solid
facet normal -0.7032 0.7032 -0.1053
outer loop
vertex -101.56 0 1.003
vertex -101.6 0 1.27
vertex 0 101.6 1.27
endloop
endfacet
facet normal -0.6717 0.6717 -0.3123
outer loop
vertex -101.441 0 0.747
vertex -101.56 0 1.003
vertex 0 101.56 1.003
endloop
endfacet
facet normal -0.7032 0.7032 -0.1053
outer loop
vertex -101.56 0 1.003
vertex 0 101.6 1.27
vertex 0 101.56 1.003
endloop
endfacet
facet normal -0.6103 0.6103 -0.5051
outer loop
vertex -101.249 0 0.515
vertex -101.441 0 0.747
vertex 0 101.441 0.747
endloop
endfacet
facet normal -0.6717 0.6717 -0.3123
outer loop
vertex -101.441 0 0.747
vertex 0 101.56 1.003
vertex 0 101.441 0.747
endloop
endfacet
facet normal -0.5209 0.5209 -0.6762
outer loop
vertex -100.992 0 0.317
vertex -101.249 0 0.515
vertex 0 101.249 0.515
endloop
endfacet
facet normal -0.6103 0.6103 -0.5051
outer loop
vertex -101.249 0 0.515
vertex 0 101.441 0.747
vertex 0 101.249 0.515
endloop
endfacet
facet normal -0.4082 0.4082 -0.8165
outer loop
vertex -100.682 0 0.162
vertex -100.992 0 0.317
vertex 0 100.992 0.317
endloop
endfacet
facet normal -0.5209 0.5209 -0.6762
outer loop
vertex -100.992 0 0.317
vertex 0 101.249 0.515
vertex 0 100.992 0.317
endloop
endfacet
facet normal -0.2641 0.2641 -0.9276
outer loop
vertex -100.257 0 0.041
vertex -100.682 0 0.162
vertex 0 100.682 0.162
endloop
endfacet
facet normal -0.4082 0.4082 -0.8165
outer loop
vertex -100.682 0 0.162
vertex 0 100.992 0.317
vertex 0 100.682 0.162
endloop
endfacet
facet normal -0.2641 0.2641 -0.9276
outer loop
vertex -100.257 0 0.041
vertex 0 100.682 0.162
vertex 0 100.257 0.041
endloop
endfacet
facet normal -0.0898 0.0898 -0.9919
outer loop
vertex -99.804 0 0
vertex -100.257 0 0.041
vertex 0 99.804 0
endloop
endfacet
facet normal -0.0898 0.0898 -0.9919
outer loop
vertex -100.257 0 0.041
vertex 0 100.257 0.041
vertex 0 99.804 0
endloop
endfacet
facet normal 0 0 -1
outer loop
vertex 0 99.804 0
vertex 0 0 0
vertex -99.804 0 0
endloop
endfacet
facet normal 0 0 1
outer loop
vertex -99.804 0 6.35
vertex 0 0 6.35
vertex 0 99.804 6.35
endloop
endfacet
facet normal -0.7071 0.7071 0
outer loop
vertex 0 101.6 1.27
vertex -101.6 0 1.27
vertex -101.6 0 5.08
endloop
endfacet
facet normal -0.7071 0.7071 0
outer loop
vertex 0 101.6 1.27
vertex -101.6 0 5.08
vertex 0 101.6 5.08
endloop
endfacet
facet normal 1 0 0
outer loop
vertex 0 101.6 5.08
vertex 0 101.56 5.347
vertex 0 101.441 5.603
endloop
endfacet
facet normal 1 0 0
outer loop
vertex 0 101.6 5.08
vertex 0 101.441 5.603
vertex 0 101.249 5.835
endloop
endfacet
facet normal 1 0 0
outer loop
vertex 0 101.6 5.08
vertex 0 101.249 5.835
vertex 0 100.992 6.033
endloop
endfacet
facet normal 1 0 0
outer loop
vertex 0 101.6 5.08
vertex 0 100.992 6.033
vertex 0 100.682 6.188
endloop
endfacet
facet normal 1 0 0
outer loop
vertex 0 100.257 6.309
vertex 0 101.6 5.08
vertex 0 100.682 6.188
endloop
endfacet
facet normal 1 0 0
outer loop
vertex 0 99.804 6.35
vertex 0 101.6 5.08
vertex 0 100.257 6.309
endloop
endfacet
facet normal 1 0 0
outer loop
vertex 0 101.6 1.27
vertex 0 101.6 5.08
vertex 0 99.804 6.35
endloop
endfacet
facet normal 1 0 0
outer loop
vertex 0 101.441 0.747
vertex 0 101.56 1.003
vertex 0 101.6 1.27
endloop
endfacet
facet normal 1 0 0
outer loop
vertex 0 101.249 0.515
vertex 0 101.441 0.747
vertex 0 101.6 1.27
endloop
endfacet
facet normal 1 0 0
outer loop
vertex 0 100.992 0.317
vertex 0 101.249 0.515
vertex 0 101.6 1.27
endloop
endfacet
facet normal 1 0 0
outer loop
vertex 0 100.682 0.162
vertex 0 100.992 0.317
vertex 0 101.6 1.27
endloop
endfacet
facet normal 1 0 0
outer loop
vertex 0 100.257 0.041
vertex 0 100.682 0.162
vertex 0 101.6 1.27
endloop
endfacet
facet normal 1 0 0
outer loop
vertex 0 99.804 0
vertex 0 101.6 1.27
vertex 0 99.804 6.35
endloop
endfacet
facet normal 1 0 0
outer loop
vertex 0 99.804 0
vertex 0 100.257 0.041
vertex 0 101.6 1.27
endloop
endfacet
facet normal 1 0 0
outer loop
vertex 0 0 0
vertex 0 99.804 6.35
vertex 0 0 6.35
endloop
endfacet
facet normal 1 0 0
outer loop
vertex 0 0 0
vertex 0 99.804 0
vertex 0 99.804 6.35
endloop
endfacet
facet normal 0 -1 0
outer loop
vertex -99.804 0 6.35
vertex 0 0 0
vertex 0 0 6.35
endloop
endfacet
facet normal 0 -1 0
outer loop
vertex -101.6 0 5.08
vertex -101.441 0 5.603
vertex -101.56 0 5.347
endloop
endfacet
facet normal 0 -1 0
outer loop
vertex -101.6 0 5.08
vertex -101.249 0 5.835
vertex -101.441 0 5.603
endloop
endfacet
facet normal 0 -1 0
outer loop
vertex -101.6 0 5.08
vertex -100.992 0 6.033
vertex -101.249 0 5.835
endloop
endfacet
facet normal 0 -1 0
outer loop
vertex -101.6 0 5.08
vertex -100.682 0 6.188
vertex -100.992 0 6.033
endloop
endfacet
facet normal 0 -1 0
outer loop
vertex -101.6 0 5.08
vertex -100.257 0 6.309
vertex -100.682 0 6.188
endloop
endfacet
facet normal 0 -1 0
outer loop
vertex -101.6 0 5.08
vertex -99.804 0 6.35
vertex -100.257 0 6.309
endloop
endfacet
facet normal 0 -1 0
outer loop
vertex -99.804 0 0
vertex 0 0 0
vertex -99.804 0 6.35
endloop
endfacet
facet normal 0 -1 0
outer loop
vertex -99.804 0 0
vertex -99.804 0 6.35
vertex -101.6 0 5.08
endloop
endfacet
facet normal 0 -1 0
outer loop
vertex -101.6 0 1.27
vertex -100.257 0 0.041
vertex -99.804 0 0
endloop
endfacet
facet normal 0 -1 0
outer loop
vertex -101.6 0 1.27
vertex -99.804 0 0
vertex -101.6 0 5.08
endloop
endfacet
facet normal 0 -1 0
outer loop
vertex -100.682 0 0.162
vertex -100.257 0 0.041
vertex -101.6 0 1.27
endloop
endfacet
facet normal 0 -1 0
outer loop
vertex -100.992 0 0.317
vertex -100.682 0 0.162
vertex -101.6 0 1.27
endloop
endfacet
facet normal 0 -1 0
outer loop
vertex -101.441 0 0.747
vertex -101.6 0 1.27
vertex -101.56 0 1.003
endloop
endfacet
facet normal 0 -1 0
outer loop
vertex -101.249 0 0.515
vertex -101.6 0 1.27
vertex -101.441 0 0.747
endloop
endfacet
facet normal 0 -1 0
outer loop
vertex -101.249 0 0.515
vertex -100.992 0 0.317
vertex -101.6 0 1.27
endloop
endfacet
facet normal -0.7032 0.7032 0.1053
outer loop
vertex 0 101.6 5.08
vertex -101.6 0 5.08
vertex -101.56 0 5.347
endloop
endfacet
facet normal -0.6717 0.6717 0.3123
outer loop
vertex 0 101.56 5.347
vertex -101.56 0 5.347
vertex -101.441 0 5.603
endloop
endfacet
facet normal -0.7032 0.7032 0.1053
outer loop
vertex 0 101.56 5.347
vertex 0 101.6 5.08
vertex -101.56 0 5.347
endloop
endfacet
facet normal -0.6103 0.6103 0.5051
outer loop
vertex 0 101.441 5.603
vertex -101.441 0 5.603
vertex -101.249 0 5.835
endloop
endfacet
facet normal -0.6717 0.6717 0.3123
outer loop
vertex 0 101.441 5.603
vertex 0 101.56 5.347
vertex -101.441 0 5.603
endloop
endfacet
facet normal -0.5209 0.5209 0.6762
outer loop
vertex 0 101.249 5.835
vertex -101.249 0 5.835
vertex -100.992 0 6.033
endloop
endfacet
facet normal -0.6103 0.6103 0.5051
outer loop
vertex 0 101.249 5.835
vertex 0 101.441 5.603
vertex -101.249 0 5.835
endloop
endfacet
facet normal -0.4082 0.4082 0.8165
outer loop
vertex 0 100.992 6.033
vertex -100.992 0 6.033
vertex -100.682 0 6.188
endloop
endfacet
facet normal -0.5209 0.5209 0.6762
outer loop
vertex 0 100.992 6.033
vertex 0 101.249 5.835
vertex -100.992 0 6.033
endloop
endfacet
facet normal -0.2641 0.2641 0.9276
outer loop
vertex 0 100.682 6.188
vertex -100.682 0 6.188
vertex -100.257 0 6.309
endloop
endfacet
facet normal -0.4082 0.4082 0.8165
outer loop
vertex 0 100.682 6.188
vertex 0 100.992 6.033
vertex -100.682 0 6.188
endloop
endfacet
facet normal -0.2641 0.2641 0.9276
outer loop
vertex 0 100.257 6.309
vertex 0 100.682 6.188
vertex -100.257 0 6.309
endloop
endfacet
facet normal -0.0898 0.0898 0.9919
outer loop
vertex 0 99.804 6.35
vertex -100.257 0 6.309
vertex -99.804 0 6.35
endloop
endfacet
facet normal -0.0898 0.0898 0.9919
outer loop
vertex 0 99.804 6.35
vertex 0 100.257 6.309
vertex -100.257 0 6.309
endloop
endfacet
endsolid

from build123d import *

# Parameters (mm, degrees)
BOSS_EXTRUDE1_DEPTH = 6.35
FILLET2_R           = 1.27
FILLET3_R           = 1.27


with BuildPart() as part:
    # Sketch1 → Boss-Extrude1 (new body)
    with BuildSketch(Plane.XY):
        Polygon((0, 0), (-101.6, 0), (0, 101.6), align=None)
    extrude(amount=BOSS_EXTRUDE1_DEPTH)

    # Fillet2
    fillet2_edges = [part.edges().sort_by_distance(p)[0] for p in [
        (-50.8, 50.8, 6.35),
    ]]
    fillet(fillet2_edges, radius=FILLET2_R)

    # Fillet3
    fillet3_edges = [part.edges().sort_by_distance(p)[0] for p in [
        (-50.8, 50.8, 0),
    ]]
    fillet(fillet3_edges, radius=FILLET3_R)


solid = part.part
